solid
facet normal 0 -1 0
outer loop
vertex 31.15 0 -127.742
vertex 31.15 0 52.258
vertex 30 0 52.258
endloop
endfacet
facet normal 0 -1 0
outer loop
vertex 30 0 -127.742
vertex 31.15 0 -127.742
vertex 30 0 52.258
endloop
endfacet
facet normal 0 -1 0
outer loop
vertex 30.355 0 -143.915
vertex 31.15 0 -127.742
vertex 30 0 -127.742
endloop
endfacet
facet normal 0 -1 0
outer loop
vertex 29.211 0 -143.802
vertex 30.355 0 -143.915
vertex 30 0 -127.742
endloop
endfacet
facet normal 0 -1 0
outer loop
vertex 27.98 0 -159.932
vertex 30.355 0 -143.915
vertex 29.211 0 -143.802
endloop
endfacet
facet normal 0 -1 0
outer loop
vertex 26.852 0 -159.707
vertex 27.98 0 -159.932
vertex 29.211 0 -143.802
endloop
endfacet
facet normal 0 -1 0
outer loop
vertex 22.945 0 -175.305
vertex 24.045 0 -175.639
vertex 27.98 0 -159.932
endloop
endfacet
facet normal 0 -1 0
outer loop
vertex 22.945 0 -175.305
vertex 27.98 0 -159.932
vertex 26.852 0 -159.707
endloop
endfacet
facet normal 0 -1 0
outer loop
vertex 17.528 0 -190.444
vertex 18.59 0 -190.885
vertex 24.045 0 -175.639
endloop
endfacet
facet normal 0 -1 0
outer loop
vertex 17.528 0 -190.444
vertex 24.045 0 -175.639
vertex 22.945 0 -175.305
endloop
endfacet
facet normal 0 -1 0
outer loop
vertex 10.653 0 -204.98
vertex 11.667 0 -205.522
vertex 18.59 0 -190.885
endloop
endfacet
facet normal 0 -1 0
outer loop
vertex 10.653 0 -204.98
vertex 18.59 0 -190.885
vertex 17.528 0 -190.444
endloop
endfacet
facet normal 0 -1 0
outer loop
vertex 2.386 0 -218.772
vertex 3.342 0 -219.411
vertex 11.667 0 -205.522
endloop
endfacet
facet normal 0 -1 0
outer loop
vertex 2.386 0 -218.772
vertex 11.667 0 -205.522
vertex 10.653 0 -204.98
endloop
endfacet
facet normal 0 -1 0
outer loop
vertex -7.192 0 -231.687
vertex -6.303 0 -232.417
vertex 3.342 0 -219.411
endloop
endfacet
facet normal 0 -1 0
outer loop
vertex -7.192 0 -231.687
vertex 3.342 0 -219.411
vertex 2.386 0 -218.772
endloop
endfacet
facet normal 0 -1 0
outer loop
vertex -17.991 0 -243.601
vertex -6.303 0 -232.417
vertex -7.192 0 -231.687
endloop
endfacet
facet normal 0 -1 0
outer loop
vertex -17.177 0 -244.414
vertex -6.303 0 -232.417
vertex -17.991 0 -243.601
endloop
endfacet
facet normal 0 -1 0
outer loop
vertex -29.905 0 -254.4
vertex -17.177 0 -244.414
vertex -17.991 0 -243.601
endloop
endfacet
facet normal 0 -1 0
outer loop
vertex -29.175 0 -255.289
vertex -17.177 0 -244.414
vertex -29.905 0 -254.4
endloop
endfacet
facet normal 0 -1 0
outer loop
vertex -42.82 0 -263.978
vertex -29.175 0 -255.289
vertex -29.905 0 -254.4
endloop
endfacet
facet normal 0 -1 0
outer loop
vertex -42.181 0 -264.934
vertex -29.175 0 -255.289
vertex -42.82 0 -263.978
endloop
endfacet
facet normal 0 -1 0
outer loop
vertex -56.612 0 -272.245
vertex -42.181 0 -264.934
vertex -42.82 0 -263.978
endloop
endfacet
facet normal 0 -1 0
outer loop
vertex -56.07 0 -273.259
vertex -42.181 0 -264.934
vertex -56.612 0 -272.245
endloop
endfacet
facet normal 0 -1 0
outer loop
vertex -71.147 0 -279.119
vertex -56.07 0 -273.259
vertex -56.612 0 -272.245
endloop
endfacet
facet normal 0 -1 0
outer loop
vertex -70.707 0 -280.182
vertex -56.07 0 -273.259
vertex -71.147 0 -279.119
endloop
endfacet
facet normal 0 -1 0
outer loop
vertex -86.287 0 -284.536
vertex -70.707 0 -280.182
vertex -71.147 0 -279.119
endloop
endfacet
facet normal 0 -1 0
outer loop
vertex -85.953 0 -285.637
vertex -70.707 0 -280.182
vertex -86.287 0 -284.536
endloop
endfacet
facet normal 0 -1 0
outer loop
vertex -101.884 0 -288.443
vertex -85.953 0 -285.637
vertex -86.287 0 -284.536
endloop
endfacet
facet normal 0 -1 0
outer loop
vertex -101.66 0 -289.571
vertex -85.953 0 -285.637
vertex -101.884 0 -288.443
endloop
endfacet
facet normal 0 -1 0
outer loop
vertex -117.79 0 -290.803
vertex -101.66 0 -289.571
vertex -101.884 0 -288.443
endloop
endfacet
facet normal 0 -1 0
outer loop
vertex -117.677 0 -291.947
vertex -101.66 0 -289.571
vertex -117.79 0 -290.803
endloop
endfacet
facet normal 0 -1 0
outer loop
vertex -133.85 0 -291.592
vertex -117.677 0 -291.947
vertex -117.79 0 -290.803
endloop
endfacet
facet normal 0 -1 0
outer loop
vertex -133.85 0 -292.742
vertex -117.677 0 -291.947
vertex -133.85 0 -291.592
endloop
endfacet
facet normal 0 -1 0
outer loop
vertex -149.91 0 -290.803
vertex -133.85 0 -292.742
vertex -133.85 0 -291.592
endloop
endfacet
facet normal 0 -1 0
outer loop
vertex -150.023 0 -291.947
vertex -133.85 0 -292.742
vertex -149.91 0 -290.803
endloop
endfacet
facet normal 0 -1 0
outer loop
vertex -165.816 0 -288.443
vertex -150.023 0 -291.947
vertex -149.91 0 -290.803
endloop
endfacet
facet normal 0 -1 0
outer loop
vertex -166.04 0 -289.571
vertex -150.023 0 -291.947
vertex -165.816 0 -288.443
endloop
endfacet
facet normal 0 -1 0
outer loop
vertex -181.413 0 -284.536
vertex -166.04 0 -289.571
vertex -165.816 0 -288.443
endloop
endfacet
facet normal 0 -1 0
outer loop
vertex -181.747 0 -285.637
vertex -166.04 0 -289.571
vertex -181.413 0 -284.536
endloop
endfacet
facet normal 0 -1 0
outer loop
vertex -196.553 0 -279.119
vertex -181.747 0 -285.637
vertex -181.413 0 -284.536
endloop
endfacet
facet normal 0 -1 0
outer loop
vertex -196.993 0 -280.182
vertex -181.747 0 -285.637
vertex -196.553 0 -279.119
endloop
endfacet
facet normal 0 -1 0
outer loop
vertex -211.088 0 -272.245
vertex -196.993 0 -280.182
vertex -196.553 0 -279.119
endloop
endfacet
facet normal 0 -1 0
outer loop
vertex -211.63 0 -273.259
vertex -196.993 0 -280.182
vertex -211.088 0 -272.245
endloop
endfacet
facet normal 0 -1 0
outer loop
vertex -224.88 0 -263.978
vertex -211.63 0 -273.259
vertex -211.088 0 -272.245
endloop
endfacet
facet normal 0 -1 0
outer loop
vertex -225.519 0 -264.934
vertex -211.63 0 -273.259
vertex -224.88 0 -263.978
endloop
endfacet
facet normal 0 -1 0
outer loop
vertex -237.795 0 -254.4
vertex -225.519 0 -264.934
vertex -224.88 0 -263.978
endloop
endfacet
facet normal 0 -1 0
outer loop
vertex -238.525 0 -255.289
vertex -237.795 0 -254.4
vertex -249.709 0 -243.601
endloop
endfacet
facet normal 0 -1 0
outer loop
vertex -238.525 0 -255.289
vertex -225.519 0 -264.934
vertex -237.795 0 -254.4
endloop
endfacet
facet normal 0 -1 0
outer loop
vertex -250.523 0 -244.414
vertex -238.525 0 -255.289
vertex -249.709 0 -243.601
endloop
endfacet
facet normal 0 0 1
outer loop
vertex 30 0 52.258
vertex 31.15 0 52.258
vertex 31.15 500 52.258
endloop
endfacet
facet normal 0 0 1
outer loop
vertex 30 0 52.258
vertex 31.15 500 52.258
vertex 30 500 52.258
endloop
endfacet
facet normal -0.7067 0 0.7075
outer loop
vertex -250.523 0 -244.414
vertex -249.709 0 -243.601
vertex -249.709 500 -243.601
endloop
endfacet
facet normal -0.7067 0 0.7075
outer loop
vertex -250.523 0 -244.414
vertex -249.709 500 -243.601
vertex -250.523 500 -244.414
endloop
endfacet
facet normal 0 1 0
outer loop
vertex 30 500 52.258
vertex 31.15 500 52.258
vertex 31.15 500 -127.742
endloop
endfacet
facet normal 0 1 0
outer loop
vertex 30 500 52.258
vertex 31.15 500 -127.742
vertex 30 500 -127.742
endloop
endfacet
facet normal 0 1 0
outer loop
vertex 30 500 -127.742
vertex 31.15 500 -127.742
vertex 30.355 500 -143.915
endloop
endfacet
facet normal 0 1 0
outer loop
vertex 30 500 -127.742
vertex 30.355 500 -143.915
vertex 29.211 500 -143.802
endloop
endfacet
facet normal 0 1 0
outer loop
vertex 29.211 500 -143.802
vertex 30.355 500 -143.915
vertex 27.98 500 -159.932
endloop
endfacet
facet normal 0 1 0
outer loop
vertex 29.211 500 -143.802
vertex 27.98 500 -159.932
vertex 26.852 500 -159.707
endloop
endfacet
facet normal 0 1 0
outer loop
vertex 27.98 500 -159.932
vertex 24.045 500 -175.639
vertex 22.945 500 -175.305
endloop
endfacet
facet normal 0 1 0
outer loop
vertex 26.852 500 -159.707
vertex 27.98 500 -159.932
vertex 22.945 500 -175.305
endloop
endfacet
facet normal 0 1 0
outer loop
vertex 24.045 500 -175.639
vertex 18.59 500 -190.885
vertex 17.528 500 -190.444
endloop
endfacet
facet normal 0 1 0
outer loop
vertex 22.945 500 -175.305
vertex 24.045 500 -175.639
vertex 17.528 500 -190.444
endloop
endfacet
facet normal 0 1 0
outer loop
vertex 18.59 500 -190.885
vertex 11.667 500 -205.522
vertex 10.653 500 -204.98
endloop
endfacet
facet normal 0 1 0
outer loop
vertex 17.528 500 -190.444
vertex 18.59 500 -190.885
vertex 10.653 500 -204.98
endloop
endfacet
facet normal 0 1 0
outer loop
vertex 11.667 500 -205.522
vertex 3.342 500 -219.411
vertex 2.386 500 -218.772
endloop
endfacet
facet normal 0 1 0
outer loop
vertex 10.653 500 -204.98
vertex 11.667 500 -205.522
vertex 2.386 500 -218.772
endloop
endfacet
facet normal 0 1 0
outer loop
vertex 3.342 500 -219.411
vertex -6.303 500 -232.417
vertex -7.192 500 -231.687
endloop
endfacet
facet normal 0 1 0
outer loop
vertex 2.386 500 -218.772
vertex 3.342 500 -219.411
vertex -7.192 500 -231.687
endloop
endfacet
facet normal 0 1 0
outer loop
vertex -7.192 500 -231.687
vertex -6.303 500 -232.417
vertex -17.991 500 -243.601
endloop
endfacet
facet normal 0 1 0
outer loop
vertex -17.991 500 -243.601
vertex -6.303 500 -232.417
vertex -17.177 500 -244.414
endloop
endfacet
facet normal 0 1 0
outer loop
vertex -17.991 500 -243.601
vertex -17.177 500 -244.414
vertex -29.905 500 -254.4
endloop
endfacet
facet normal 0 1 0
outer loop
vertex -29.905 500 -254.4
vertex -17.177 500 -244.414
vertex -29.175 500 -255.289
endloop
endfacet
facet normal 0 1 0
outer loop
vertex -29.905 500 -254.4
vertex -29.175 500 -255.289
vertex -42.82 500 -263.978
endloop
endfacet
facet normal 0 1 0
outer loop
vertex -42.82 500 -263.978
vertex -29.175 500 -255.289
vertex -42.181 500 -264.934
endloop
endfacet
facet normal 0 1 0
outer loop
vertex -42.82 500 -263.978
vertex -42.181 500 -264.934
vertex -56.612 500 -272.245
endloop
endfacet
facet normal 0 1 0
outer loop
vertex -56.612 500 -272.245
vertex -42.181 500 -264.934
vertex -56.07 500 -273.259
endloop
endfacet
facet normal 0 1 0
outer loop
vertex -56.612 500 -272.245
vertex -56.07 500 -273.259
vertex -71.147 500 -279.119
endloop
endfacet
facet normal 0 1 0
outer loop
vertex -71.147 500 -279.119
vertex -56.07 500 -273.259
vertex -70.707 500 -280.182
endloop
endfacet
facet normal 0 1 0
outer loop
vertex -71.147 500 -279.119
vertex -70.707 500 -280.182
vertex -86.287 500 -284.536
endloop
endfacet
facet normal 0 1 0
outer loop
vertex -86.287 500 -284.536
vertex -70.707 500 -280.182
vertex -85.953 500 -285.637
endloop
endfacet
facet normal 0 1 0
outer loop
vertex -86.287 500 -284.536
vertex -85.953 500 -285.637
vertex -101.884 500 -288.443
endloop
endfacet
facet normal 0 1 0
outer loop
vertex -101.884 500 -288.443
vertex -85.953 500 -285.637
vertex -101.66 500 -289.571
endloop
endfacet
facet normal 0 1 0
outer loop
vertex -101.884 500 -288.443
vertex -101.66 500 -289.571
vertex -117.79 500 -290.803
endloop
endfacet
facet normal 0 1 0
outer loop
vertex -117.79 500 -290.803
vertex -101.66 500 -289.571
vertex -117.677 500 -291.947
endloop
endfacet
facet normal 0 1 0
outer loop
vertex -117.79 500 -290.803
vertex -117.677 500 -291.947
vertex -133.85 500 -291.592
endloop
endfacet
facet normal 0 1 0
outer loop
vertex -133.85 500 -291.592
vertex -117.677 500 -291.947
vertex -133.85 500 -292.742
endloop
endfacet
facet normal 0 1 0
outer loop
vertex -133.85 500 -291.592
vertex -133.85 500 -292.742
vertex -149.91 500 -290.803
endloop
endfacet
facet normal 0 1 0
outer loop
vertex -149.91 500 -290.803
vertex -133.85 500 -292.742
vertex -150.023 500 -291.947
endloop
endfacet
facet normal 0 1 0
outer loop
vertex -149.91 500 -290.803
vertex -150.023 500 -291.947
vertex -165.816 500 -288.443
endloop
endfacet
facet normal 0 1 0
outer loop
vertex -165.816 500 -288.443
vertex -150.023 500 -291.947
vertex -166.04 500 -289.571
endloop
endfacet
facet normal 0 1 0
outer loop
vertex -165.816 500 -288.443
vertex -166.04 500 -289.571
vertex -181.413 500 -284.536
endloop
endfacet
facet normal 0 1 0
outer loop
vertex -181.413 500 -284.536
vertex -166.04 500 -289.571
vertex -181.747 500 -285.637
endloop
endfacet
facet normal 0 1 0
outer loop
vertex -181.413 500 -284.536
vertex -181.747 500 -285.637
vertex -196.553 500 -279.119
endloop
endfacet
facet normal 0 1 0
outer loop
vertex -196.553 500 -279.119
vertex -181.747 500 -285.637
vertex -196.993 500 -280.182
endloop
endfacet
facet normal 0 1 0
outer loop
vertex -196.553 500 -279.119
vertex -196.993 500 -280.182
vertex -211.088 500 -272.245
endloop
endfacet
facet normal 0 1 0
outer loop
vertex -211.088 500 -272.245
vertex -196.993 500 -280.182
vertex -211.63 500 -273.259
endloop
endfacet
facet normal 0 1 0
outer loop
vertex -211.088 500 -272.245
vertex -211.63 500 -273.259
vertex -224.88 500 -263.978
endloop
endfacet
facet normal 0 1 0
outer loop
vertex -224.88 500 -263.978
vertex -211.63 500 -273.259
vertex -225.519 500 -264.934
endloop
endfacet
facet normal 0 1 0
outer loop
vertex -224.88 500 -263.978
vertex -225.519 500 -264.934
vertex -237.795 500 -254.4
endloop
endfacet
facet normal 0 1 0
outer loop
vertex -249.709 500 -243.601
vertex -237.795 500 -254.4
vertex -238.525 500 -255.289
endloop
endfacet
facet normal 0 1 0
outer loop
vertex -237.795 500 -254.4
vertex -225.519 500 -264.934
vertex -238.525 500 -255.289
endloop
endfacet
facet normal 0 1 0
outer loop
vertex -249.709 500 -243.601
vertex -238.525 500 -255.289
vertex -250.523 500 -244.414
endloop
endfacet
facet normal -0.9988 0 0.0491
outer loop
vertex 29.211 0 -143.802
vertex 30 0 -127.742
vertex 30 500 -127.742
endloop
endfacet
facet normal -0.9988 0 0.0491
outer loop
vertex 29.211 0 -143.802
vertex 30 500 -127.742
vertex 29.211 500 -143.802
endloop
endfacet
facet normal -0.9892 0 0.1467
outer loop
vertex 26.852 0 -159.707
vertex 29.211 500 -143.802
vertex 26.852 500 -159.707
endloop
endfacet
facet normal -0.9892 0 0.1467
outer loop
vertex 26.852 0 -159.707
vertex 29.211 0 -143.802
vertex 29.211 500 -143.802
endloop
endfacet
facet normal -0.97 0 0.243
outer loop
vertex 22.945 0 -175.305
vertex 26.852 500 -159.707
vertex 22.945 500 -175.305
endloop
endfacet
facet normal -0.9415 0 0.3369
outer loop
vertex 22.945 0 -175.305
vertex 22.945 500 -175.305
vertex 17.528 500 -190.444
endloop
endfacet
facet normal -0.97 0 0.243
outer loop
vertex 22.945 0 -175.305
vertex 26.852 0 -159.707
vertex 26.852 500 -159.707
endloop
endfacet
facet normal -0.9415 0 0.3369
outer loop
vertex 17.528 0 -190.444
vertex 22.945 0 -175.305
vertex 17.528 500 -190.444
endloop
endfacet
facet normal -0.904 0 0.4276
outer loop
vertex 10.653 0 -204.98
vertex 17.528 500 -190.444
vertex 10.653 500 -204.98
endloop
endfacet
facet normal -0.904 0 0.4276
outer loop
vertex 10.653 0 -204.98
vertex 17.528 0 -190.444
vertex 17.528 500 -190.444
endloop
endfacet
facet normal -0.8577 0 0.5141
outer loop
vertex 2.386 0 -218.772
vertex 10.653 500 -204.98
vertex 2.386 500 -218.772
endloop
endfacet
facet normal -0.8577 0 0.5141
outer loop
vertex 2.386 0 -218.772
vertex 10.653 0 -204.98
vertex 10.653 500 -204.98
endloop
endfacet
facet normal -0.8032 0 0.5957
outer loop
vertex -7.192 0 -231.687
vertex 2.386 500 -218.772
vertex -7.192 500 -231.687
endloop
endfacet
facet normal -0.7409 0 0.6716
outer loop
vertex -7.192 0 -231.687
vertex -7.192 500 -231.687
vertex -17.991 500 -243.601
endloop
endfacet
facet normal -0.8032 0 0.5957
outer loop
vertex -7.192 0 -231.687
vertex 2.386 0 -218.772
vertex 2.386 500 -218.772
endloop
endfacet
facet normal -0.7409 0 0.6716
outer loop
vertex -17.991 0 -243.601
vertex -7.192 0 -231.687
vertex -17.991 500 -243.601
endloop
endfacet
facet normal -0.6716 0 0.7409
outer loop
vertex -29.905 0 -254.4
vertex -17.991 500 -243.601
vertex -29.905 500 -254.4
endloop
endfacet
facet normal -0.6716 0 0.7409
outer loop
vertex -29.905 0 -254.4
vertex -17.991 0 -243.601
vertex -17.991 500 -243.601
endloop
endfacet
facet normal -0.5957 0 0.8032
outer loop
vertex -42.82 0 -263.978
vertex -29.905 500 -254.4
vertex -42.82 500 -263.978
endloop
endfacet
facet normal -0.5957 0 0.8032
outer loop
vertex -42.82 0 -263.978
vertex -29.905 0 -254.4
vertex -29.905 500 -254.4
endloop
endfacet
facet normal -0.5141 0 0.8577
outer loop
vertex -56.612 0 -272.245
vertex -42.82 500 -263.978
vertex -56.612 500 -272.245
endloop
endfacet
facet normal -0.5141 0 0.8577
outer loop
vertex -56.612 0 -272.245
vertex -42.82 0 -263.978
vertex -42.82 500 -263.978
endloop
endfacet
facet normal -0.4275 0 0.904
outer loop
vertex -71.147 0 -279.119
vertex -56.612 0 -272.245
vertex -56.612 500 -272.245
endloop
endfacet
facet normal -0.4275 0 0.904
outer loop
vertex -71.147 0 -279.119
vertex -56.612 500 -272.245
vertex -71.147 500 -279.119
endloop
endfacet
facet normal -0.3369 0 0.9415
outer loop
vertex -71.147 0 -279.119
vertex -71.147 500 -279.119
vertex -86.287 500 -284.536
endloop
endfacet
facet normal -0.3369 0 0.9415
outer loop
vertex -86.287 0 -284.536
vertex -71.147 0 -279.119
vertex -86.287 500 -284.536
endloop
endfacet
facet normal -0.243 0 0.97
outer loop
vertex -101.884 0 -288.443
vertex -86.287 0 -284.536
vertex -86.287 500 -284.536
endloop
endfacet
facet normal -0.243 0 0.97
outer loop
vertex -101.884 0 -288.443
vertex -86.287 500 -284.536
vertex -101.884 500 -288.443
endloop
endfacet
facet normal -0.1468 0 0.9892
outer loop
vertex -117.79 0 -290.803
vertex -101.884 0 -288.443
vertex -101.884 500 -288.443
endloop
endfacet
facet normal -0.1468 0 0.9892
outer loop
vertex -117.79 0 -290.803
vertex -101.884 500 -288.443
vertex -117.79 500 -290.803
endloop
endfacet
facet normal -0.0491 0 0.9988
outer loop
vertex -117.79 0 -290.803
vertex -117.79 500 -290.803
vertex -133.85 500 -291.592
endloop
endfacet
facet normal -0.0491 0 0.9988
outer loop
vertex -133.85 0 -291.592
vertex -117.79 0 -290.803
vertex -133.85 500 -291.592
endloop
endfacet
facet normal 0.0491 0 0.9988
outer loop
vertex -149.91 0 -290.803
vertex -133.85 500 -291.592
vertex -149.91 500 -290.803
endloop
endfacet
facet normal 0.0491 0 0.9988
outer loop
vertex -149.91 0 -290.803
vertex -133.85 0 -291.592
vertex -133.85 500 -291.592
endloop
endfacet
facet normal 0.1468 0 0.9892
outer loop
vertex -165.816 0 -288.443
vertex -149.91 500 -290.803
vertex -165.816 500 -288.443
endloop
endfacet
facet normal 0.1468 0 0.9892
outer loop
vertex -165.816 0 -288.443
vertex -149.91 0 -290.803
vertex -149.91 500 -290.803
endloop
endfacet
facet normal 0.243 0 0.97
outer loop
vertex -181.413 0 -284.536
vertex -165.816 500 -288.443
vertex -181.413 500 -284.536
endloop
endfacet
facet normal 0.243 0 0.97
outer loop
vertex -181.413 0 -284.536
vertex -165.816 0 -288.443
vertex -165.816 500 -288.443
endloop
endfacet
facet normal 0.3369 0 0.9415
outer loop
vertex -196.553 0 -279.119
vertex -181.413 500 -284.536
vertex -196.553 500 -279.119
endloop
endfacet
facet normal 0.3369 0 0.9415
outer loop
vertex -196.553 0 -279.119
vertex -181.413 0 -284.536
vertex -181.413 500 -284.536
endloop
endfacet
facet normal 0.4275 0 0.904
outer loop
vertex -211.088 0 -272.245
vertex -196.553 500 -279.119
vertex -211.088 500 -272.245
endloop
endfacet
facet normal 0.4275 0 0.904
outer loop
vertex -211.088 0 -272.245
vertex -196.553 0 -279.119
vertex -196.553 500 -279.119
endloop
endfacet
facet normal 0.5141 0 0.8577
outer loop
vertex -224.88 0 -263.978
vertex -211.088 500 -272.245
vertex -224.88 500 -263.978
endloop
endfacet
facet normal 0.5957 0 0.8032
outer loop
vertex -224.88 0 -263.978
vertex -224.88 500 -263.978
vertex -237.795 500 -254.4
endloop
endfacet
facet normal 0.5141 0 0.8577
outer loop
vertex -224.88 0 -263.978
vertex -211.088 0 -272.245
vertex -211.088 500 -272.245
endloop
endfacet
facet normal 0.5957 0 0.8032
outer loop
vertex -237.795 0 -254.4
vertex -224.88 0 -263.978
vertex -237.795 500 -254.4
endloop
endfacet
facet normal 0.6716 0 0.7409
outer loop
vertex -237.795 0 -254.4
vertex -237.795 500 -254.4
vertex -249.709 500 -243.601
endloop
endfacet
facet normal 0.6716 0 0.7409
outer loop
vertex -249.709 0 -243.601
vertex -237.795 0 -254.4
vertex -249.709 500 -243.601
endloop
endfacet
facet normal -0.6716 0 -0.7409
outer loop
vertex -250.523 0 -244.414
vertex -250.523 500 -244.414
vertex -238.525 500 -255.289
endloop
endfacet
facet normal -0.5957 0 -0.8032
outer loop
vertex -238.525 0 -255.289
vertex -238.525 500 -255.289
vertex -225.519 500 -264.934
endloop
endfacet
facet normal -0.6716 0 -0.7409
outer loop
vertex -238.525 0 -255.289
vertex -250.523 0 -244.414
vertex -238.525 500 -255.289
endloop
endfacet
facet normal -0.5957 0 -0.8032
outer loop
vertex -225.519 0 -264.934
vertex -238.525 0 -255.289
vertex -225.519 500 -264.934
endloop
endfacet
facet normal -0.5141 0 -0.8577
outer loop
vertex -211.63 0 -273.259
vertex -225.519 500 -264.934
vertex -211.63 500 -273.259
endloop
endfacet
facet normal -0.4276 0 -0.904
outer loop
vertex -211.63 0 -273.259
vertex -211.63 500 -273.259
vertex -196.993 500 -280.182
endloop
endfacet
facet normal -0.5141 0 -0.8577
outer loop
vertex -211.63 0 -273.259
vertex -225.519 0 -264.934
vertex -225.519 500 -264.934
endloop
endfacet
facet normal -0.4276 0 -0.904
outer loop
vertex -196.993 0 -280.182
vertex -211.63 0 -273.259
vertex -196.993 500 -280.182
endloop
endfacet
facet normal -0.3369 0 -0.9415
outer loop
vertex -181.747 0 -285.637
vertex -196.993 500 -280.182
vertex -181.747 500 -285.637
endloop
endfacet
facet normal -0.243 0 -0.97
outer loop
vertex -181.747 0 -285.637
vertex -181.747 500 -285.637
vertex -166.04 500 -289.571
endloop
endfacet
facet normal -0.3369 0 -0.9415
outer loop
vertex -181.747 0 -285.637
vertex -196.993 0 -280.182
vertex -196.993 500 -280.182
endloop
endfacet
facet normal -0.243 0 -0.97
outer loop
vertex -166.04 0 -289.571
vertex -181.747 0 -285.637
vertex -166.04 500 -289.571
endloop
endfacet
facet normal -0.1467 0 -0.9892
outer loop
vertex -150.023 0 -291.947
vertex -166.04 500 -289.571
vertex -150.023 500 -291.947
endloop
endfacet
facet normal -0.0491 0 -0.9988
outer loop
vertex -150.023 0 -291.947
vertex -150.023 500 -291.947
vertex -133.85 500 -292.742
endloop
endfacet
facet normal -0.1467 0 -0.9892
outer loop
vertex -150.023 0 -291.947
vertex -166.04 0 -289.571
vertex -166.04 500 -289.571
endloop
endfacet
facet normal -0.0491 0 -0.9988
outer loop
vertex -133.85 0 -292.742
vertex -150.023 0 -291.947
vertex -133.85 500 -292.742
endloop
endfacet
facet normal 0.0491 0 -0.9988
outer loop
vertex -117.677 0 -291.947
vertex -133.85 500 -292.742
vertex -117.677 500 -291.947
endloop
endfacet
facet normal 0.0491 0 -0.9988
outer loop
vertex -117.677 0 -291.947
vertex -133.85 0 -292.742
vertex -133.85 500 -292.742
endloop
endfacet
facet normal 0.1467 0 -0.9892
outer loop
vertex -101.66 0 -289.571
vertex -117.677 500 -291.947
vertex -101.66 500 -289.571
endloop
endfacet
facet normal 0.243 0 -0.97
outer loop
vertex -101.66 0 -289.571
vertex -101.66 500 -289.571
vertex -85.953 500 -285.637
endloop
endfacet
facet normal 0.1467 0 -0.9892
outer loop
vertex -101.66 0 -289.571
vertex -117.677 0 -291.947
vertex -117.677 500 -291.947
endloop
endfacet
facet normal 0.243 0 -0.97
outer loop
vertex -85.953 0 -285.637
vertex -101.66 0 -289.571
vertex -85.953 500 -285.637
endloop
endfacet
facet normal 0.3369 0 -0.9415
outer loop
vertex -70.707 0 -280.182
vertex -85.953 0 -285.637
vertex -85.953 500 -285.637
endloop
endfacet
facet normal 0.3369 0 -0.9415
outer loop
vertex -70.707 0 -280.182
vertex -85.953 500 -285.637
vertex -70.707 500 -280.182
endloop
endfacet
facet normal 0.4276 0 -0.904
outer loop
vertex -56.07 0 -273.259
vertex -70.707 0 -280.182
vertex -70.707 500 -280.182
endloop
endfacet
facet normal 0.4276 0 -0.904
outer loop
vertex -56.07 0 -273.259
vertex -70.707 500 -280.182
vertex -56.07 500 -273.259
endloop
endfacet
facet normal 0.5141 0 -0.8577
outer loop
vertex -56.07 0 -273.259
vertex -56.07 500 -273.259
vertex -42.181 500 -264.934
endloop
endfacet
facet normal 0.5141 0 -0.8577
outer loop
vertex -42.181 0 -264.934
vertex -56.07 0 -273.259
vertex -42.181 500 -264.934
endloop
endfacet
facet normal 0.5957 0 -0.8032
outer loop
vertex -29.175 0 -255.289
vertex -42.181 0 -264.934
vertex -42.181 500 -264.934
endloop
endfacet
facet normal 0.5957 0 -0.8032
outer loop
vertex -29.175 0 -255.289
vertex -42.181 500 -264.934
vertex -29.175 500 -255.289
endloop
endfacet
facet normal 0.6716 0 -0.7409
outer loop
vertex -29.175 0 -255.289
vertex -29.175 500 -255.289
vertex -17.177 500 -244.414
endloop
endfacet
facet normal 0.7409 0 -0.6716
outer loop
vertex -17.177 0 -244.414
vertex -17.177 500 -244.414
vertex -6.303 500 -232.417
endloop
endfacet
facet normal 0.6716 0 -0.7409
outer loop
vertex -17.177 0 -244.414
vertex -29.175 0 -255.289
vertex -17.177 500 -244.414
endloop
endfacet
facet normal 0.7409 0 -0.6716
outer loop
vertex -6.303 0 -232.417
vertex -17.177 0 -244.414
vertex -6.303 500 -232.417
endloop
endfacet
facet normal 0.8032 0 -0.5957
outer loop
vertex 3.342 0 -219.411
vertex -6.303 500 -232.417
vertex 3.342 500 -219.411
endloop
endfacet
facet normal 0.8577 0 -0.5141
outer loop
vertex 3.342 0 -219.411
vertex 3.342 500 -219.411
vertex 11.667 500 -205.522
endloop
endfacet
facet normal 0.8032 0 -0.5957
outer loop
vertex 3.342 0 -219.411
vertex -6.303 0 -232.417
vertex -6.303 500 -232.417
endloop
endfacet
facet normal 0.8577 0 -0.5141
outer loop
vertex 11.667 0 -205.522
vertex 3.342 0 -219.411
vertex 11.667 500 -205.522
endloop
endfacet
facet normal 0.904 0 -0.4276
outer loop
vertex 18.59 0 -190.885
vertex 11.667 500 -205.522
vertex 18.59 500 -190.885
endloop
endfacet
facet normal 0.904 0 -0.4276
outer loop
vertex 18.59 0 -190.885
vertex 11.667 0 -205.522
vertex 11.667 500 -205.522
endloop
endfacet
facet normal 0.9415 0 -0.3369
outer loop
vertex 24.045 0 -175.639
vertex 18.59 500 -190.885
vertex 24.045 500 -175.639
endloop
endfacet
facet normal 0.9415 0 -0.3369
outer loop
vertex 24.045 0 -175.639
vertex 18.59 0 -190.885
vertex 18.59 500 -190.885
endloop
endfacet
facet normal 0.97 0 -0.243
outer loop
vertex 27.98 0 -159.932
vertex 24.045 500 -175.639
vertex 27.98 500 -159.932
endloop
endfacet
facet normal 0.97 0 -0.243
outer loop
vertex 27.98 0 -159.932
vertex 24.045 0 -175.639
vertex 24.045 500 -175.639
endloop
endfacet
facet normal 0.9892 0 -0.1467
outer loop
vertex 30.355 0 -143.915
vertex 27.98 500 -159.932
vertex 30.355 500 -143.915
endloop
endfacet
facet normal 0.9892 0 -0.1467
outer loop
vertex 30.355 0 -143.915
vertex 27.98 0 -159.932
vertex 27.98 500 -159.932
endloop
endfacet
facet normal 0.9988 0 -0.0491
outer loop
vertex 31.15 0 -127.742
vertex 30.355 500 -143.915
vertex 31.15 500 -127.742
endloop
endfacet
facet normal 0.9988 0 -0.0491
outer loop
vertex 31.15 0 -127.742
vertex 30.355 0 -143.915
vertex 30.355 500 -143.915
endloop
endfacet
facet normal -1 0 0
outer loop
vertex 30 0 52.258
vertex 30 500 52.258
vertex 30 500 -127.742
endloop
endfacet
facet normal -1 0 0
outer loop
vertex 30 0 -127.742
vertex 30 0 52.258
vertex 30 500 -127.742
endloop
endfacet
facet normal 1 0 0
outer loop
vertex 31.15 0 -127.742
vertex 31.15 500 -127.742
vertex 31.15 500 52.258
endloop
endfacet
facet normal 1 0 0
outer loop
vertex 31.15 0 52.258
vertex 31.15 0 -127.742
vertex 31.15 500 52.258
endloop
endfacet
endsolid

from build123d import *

# Parameters (mm, degrees)
SALIENTE_EXTRUIR1_DEPTH = 500


with BuildPart() as part:
    # Croquis3 → Saliente-Extruir1 (new body)
    with BuildSketch(Plane(origin=(0, 0, 0), x_dir=(1, 0, 0), z_dir=(0, 1, 0))):
        with BuildLine():
            Line((31.15, 127.741818938), (31.15, -52.258181062))
            Line((31.15, -52.258181062), (30, -52.258181062))
            Line((30, -52.258181062), (30, 127.741818938))
            ThreePointArc((30, 127.741818938), (-71.147319607, 279.11948034), (-249.709446097, 243.601265035))
            Line((-249.709446097, 243.601265035), (-250.522618896, 244.414437834))
            ThreePointArc((-250.522618896, 244.414437834), (-70.70723366, 280.181941802), (31.15, 127.741818938))
        make_face()
    extrude(amount=SALIENTE_EXTRUIR1_DEPTH)


solid = part.part
